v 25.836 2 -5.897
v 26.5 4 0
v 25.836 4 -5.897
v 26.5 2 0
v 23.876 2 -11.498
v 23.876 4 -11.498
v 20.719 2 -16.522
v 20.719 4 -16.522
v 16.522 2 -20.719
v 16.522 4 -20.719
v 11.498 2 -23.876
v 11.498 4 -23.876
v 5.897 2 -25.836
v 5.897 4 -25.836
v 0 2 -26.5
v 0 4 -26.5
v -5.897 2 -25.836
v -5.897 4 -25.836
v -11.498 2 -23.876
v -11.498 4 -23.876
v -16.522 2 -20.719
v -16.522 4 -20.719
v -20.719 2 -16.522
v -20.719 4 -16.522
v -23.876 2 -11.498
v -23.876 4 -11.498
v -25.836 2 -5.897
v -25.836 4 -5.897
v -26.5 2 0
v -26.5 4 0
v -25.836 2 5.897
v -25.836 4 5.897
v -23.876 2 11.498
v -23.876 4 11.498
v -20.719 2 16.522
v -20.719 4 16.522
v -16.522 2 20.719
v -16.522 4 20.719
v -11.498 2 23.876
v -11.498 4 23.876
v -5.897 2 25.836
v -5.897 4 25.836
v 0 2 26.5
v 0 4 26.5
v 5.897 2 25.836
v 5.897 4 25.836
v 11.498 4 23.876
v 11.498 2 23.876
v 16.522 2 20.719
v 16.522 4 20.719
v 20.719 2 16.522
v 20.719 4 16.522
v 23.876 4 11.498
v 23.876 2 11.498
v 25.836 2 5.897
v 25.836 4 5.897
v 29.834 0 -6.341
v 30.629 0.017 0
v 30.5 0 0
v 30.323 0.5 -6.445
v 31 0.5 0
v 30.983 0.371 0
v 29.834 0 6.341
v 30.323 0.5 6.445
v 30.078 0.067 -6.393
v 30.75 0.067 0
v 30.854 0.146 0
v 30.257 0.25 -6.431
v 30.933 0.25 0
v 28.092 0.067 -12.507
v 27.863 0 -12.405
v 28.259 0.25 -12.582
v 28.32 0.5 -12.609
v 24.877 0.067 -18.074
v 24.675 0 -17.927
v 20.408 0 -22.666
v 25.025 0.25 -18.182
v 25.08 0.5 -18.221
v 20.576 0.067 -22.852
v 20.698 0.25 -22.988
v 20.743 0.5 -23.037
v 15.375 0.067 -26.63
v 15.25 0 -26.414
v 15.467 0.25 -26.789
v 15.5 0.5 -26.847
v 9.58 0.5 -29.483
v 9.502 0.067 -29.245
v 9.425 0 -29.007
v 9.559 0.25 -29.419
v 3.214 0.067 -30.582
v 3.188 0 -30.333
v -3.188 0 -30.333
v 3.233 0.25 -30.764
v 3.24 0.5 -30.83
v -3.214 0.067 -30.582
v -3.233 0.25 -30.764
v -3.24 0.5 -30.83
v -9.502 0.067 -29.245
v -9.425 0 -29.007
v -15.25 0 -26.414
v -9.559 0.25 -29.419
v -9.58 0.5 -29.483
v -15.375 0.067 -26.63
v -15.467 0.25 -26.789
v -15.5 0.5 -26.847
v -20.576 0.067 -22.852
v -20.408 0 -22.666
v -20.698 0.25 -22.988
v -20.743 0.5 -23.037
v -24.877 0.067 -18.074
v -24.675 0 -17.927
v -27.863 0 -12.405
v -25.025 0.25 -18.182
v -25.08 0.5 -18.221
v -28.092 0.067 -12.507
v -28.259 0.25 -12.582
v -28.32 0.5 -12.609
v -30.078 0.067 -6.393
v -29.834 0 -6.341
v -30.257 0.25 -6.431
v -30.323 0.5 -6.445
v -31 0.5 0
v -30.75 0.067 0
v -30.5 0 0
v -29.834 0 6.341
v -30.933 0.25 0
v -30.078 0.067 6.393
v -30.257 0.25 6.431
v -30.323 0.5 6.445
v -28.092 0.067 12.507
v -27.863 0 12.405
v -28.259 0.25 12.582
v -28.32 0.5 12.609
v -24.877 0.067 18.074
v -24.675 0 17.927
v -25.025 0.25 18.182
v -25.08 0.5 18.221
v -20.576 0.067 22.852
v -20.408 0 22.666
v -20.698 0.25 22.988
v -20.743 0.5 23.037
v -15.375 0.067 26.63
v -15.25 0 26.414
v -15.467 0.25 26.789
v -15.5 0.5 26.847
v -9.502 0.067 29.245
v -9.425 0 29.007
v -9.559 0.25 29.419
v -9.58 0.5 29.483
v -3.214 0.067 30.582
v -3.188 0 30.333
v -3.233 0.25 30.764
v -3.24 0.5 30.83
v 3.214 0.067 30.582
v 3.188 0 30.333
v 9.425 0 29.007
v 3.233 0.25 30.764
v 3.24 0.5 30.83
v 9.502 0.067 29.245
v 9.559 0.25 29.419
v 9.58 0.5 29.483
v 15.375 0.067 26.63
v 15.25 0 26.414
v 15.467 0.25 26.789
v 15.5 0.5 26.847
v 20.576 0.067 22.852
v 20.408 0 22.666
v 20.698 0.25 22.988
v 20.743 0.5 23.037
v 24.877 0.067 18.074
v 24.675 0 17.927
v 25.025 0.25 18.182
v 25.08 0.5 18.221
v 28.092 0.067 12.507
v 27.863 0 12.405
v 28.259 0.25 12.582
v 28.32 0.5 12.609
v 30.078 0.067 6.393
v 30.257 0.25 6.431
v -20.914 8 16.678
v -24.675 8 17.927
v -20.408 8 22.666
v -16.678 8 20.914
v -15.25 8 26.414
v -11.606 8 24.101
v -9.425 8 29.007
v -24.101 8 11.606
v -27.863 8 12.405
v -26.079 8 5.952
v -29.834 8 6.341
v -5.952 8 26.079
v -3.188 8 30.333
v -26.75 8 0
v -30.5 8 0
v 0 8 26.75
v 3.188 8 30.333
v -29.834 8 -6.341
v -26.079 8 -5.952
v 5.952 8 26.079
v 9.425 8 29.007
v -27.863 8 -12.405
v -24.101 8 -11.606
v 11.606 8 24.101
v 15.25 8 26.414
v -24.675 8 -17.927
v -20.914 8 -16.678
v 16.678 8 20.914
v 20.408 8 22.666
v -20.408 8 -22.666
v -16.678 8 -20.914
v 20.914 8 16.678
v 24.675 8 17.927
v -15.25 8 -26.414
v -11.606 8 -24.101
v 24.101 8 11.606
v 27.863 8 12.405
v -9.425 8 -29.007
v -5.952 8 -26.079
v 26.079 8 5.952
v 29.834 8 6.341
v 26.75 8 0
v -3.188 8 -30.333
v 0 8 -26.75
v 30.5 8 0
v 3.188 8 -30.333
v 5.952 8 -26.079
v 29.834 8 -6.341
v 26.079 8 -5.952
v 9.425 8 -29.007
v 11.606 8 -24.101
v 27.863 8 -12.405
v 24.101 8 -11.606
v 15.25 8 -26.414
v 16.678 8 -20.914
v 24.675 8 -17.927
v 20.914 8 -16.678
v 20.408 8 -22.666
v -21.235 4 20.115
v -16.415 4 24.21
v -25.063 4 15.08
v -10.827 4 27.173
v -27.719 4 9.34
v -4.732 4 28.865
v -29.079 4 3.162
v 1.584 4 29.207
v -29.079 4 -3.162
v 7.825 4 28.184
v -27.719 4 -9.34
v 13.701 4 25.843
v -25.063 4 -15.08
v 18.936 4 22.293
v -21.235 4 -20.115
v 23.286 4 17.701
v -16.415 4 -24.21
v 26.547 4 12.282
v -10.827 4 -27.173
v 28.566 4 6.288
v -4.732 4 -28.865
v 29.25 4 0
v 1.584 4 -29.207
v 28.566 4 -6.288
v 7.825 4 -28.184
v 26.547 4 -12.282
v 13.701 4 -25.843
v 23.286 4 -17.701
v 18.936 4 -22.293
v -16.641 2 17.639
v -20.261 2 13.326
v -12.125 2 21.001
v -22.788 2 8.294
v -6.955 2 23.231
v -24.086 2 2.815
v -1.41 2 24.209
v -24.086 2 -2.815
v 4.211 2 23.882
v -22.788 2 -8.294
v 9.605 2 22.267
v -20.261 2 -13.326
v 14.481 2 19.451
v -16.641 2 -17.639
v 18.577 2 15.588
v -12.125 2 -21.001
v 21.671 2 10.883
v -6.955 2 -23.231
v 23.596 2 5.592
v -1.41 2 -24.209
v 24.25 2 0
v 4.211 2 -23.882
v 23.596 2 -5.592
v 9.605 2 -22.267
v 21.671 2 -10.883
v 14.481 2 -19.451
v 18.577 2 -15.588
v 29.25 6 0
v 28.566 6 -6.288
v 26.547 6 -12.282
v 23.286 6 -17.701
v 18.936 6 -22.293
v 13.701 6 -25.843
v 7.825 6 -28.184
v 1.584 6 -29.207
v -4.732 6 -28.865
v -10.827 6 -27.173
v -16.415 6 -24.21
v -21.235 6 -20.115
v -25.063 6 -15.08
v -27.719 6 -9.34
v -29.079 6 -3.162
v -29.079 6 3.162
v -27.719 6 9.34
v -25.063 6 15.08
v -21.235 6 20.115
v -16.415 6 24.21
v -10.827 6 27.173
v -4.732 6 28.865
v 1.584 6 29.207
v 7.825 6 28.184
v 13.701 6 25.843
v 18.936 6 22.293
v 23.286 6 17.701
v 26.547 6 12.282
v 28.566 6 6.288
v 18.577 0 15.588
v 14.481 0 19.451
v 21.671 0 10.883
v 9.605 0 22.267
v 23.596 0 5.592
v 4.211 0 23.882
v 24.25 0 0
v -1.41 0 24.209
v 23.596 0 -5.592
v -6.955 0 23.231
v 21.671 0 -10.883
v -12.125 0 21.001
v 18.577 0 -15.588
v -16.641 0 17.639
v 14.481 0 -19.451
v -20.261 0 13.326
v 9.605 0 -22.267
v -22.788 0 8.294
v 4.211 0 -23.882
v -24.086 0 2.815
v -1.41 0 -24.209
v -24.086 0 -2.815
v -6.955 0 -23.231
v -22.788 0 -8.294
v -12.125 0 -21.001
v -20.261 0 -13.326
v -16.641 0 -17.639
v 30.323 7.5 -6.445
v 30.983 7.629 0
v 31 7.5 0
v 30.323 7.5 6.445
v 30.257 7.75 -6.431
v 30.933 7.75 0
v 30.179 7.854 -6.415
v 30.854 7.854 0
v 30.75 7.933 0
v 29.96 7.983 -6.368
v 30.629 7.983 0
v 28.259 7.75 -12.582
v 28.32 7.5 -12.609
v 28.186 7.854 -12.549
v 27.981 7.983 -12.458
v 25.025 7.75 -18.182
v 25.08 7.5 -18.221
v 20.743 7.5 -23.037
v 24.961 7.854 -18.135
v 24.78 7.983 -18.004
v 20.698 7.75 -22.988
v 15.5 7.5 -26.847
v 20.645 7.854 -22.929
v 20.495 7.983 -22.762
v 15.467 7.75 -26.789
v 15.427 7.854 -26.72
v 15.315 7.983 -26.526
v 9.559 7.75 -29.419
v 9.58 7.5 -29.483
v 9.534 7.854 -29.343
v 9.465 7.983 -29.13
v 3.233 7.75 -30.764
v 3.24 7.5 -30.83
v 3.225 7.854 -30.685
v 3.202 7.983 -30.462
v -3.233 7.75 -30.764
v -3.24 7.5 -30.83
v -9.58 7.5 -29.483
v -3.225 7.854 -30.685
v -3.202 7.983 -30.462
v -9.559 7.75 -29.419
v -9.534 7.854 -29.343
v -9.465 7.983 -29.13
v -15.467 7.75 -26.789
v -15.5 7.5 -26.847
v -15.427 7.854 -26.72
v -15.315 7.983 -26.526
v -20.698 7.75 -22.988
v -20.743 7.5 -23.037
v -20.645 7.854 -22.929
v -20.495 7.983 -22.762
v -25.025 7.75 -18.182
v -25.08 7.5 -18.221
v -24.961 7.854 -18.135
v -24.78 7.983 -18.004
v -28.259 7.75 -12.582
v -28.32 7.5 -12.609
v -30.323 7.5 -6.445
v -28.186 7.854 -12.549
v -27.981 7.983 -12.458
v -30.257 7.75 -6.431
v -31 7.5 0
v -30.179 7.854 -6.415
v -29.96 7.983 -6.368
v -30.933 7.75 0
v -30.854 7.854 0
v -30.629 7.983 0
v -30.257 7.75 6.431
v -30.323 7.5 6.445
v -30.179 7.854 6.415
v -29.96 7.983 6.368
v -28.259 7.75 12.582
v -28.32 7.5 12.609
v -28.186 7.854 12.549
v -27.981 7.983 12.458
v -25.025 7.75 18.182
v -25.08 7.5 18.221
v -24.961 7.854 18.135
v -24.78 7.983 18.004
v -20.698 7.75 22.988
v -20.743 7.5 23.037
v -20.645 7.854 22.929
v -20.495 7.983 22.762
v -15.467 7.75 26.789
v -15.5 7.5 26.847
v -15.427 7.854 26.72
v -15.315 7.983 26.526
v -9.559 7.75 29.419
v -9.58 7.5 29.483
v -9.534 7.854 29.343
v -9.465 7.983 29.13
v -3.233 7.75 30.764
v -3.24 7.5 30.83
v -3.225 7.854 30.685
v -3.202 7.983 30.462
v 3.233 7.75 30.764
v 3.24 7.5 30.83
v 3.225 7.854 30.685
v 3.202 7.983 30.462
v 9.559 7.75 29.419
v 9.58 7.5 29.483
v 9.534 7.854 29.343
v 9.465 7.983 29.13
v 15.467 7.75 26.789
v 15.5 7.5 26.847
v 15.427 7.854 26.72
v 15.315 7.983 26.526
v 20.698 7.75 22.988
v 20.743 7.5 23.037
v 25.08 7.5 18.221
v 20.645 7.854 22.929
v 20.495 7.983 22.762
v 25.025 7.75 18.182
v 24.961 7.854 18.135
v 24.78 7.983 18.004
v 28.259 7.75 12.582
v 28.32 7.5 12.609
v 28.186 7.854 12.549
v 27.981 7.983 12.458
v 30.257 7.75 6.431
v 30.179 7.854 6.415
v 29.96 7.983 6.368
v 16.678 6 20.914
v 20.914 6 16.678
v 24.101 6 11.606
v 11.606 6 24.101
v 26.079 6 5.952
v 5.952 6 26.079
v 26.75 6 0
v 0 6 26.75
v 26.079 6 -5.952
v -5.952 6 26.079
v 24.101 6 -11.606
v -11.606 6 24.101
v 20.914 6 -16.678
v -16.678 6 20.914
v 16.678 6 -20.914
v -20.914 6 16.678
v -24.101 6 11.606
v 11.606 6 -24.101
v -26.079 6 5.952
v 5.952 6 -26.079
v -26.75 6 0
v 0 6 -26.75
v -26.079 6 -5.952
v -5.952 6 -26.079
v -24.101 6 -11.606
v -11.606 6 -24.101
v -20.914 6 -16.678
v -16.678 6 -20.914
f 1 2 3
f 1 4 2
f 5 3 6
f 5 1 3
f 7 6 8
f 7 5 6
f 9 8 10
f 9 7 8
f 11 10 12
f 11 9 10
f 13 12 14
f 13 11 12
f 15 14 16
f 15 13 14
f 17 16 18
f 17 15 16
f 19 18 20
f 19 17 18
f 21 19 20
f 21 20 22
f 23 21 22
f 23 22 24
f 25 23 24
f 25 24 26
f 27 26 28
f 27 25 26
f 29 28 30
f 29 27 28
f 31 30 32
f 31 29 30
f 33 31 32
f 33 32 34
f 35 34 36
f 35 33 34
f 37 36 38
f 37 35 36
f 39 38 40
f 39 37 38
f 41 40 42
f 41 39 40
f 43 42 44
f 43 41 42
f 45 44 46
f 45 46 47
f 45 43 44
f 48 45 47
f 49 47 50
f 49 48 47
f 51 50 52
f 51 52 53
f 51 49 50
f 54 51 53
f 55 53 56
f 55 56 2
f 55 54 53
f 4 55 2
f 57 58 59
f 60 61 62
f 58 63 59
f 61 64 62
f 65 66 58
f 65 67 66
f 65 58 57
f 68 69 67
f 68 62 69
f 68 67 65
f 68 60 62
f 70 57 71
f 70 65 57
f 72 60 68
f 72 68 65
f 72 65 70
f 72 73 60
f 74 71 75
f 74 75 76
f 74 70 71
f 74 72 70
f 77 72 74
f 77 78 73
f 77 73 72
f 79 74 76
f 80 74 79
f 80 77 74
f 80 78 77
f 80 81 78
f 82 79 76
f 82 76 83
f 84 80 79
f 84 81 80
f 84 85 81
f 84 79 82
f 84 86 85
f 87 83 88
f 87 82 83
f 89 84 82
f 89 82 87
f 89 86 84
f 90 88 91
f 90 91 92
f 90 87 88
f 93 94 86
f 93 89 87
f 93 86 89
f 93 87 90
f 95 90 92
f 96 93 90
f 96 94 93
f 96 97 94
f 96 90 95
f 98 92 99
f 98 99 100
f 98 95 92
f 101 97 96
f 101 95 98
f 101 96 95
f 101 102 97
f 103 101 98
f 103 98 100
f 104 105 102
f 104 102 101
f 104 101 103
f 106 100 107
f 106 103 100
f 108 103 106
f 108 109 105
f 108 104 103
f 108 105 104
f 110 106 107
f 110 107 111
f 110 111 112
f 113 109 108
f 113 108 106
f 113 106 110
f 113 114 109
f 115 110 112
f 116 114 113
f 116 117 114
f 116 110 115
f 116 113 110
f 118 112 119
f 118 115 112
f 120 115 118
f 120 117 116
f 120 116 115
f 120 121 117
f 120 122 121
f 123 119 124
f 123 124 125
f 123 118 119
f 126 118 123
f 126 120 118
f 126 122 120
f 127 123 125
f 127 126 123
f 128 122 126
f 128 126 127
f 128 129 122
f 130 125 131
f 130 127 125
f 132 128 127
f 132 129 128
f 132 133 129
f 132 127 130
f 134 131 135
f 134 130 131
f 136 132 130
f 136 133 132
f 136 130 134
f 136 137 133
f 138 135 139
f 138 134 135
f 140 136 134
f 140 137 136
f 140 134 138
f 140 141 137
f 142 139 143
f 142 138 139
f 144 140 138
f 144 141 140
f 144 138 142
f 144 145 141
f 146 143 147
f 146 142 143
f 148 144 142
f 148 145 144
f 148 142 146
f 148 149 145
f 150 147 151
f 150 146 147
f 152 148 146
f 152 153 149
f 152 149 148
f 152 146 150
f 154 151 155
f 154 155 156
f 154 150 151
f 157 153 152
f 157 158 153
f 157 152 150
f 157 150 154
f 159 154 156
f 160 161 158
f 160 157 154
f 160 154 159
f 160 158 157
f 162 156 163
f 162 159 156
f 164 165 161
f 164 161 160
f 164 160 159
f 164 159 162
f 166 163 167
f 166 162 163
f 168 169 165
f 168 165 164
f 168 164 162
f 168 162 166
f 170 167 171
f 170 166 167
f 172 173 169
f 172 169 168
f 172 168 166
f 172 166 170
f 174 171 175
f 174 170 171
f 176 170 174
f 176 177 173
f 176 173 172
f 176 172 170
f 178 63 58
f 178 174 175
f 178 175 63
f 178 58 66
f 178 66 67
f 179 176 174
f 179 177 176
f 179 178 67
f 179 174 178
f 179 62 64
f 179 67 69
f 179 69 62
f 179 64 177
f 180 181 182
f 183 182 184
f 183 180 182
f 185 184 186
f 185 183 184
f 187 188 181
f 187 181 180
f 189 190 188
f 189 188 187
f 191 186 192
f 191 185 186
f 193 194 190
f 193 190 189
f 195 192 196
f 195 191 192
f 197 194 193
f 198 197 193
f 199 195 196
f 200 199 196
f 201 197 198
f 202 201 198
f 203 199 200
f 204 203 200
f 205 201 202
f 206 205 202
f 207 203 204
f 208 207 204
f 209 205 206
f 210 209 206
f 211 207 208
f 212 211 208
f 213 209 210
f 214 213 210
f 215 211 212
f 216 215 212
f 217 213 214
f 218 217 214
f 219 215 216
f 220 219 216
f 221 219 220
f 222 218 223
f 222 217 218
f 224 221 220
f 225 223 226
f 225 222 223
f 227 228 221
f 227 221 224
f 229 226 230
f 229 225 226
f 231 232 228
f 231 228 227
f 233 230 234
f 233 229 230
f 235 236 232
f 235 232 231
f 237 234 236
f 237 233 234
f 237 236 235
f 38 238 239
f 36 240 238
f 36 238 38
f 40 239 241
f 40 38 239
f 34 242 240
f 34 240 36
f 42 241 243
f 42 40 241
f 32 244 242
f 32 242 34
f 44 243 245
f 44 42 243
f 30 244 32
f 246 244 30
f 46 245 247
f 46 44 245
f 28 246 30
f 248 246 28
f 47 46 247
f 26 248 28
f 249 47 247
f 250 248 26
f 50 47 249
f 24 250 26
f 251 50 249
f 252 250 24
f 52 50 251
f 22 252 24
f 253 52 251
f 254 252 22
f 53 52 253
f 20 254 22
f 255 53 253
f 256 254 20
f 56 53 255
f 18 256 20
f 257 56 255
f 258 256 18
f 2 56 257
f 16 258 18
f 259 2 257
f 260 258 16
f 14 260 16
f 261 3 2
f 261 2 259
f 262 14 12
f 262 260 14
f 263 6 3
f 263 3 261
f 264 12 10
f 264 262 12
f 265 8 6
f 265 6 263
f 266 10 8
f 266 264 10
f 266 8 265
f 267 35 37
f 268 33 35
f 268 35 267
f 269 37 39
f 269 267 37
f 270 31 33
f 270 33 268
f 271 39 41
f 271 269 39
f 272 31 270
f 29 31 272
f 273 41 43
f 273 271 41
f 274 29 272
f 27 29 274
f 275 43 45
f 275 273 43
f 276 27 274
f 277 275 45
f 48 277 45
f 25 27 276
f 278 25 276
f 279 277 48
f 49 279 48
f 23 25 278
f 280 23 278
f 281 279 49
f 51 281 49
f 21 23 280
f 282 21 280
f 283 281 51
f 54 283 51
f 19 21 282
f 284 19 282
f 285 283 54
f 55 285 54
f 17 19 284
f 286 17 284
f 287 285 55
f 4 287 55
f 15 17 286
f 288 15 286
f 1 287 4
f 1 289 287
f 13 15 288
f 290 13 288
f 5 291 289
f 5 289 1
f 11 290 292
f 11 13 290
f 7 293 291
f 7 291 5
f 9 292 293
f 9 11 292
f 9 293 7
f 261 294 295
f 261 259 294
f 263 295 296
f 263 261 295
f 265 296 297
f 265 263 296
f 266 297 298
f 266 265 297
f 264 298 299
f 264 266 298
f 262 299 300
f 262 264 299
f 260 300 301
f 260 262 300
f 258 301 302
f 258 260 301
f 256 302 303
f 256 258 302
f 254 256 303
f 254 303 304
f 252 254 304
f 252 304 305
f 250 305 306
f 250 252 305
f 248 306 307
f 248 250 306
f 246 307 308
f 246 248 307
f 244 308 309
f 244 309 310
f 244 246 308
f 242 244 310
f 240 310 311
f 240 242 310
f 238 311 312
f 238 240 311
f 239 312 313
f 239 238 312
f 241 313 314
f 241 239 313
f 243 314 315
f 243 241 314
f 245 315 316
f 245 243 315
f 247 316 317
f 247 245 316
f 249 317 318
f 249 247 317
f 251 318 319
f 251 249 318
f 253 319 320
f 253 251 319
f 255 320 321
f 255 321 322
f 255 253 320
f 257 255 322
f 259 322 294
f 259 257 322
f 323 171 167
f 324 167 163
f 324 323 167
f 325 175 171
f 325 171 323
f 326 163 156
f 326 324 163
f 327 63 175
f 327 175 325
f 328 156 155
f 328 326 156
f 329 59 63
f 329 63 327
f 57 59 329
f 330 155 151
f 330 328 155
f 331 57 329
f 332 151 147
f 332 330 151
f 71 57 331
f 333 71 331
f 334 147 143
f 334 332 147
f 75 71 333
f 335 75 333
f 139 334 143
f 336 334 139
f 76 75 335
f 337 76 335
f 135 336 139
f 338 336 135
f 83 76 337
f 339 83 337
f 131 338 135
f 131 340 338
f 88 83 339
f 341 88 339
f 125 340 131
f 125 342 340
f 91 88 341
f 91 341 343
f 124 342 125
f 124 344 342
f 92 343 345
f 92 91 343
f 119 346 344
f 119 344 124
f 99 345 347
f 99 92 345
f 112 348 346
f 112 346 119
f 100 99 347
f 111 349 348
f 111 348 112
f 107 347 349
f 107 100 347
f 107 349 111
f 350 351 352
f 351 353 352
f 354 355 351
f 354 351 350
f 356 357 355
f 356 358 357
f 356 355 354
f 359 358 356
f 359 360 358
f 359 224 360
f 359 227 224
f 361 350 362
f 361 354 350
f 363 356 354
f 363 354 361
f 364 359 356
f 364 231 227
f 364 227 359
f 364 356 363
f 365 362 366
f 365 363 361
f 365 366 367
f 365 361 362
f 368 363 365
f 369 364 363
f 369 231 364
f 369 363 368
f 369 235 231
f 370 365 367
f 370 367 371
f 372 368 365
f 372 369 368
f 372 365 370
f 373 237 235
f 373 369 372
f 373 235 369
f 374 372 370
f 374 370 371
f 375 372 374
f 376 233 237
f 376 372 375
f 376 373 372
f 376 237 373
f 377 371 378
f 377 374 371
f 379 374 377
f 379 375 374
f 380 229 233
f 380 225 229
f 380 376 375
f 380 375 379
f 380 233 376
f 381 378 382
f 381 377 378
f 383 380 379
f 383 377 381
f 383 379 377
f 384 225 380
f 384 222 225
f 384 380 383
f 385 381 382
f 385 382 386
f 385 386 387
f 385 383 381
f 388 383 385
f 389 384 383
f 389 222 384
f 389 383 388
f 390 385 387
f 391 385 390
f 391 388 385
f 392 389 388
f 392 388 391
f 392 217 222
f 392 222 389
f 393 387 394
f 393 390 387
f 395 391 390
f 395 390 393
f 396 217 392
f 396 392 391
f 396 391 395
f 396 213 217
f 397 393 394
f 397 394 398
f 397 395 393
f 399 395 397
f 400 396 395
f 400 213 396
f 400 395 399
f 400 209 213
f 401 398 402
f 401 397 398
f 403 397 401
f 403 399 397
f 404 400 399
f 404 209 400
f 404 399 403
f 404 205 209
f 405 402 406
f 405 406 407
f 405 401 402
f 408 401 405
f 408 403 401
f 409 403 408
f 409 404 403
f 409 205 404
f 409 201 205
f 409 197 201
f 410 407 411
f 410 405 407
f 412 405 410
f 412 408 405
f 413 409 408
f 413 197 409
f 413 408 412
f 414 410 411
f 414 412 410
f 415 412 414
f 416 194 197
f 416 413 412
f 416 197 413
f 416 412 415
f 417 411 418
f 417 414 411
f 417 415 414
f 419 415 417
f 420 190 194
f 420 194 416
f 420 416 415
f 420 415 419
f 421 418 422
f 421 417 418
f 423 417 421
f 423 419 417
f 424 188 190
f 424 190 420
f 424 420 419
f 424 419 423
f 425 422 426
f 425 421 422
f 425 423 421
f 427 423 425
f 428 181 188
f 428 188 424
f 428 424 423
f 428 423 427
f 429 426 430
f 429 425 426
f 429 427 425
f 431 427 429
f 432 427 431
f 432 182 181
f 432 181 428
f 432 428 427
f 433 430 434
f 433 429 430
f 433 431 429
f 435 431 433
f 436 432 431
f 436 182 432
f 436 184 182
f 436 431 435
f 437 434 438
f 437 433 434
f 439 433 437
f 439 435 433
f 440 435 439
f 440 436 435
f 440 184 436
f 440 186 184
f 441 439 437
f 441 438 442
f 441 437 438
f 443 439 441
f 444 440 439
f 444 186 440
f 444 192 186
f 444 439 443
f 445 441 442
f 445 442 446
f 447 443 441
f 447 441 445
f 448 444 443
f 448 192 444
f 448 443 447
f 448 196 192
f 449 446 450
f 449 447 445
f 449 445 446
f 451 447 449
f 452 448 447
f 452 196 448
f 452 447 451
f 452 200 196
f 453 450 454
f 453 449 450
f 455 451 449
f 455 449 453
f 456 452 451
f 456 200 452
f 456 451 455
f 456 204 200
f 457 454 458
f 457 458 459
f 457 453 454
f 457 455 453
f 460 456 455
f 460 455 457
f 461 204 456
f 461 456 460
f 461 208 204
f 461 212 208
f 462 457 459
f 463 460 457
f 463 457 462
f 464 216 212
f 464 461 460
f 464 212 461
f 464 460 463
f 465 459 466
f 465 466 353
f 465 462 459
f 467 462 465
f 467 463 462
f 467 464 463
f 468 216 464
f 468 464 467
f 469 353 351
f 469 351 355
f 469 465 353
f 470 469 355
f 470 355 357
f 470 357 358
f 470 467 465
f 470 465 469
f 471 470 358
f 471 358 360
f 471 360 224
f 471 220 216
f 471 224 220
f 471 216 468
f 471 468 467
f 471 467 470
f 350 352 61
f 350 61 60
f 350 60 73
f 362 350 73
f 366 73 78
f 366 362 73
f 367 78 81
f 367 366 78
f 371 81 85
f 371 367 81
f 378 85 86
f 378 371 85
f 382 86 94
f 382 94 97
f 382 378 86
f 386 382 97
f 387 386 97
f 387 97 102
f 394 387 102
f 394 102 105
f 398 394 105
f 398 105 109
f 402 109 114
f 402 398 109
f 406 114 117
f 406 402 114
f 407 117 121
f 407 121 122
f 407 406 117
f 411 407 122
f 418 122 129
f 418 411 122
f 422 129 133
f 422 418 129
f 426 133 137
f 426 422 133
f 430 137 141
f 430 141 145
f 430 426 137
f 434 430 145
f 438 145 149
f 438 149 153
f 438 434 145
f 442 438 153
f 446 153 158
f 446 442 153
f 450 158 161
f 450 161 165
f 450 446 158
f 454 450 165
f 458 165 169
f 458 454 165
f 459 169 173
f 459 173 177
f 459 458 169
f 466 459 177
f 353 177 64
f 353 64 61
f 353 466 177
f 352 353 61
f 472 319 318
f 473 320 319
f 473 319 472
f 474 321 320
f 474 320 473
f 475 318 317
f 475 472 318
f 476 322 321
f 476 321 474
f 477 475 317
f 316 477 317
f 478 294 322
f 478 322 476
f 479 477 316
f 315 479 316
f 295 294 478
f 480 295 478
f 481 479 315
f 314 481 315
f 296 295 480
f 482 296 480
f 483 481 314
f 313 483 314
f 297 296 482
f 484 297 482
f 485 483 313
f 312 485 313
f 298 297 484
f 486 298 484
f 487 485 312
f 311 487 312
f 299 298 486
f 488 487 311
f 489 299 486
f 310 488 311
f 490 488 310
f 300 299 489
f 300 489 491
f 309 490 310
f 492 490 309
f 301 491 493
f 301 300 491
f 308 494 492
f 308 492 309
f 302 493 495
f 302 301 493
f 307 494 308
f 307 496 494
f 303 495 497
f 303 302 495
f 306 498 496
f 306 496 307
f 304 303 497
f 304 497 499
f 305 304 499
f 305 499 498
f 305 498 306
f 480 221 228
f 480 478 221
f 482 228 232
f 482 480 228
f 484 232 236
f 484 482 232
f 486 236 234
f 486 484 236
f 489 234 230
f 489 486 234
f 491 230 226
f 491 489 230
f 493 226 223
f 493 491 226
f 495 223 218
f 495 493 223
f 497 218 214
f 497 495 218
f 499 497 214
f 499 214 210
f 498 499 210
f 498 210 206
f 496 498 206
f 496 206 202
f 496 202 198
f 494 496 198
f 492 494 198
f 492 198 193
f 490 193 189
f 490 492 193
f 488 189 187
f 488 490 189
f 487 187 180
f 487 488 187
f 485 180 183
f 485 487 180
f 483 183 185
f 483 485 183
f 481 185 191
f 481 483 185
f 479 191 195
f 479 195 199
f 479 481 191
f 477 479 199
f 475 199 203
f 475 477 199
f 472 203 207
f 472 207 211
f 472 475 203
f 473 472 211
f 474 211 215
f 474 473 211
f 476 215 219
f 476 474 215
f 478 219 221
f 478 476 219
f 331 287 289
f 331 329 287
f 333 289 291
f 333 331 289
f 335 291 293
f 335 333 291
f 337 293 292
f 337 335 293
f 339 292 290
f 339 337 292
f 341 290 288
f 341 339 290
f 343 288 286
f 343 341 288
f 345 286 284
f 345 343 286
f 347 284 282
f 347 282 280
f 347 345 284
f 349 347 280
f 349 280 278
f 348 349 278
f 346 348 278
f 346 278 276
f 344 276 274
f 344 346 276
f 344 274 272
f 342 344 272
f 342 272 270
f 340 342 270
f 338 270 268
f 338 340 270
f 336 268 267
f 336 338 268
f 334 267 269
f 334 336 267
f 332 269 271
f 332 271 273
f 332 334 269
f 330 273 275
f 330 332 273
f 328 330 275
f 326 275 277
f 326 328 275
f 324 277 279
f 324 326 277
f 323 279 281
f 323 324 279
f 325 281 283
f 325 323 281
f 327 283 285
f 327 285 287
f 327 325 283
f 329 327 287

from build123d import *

# Parameters (mm, degrees)
FILLET1_R = 0.5


with BuildPart() as part:
    # Sketch1 → Revolve1 (revolve)
    with BuildSketch(Plane.XY):
        Polygon((24.25, 0), (31, 0), (31, 8), (26.75, 8), (26.75, 6), (29.25, 6), (29.25, 4), (26.5, 4), (26.5, 2), (24.25, 2), align=None)
    revolve(axis=Axis((0, 0, 0), (0, 1, 0)))

    # Fillet1
    fillet1_edges = [part.edges().sort_by_distance(p)[0] for p in [
        (-31, 8, 0),
        (-31, 0, 0),
    ]]
    fillet(fillet1_edges, radius=FILLET1_R)


solid = part.part
